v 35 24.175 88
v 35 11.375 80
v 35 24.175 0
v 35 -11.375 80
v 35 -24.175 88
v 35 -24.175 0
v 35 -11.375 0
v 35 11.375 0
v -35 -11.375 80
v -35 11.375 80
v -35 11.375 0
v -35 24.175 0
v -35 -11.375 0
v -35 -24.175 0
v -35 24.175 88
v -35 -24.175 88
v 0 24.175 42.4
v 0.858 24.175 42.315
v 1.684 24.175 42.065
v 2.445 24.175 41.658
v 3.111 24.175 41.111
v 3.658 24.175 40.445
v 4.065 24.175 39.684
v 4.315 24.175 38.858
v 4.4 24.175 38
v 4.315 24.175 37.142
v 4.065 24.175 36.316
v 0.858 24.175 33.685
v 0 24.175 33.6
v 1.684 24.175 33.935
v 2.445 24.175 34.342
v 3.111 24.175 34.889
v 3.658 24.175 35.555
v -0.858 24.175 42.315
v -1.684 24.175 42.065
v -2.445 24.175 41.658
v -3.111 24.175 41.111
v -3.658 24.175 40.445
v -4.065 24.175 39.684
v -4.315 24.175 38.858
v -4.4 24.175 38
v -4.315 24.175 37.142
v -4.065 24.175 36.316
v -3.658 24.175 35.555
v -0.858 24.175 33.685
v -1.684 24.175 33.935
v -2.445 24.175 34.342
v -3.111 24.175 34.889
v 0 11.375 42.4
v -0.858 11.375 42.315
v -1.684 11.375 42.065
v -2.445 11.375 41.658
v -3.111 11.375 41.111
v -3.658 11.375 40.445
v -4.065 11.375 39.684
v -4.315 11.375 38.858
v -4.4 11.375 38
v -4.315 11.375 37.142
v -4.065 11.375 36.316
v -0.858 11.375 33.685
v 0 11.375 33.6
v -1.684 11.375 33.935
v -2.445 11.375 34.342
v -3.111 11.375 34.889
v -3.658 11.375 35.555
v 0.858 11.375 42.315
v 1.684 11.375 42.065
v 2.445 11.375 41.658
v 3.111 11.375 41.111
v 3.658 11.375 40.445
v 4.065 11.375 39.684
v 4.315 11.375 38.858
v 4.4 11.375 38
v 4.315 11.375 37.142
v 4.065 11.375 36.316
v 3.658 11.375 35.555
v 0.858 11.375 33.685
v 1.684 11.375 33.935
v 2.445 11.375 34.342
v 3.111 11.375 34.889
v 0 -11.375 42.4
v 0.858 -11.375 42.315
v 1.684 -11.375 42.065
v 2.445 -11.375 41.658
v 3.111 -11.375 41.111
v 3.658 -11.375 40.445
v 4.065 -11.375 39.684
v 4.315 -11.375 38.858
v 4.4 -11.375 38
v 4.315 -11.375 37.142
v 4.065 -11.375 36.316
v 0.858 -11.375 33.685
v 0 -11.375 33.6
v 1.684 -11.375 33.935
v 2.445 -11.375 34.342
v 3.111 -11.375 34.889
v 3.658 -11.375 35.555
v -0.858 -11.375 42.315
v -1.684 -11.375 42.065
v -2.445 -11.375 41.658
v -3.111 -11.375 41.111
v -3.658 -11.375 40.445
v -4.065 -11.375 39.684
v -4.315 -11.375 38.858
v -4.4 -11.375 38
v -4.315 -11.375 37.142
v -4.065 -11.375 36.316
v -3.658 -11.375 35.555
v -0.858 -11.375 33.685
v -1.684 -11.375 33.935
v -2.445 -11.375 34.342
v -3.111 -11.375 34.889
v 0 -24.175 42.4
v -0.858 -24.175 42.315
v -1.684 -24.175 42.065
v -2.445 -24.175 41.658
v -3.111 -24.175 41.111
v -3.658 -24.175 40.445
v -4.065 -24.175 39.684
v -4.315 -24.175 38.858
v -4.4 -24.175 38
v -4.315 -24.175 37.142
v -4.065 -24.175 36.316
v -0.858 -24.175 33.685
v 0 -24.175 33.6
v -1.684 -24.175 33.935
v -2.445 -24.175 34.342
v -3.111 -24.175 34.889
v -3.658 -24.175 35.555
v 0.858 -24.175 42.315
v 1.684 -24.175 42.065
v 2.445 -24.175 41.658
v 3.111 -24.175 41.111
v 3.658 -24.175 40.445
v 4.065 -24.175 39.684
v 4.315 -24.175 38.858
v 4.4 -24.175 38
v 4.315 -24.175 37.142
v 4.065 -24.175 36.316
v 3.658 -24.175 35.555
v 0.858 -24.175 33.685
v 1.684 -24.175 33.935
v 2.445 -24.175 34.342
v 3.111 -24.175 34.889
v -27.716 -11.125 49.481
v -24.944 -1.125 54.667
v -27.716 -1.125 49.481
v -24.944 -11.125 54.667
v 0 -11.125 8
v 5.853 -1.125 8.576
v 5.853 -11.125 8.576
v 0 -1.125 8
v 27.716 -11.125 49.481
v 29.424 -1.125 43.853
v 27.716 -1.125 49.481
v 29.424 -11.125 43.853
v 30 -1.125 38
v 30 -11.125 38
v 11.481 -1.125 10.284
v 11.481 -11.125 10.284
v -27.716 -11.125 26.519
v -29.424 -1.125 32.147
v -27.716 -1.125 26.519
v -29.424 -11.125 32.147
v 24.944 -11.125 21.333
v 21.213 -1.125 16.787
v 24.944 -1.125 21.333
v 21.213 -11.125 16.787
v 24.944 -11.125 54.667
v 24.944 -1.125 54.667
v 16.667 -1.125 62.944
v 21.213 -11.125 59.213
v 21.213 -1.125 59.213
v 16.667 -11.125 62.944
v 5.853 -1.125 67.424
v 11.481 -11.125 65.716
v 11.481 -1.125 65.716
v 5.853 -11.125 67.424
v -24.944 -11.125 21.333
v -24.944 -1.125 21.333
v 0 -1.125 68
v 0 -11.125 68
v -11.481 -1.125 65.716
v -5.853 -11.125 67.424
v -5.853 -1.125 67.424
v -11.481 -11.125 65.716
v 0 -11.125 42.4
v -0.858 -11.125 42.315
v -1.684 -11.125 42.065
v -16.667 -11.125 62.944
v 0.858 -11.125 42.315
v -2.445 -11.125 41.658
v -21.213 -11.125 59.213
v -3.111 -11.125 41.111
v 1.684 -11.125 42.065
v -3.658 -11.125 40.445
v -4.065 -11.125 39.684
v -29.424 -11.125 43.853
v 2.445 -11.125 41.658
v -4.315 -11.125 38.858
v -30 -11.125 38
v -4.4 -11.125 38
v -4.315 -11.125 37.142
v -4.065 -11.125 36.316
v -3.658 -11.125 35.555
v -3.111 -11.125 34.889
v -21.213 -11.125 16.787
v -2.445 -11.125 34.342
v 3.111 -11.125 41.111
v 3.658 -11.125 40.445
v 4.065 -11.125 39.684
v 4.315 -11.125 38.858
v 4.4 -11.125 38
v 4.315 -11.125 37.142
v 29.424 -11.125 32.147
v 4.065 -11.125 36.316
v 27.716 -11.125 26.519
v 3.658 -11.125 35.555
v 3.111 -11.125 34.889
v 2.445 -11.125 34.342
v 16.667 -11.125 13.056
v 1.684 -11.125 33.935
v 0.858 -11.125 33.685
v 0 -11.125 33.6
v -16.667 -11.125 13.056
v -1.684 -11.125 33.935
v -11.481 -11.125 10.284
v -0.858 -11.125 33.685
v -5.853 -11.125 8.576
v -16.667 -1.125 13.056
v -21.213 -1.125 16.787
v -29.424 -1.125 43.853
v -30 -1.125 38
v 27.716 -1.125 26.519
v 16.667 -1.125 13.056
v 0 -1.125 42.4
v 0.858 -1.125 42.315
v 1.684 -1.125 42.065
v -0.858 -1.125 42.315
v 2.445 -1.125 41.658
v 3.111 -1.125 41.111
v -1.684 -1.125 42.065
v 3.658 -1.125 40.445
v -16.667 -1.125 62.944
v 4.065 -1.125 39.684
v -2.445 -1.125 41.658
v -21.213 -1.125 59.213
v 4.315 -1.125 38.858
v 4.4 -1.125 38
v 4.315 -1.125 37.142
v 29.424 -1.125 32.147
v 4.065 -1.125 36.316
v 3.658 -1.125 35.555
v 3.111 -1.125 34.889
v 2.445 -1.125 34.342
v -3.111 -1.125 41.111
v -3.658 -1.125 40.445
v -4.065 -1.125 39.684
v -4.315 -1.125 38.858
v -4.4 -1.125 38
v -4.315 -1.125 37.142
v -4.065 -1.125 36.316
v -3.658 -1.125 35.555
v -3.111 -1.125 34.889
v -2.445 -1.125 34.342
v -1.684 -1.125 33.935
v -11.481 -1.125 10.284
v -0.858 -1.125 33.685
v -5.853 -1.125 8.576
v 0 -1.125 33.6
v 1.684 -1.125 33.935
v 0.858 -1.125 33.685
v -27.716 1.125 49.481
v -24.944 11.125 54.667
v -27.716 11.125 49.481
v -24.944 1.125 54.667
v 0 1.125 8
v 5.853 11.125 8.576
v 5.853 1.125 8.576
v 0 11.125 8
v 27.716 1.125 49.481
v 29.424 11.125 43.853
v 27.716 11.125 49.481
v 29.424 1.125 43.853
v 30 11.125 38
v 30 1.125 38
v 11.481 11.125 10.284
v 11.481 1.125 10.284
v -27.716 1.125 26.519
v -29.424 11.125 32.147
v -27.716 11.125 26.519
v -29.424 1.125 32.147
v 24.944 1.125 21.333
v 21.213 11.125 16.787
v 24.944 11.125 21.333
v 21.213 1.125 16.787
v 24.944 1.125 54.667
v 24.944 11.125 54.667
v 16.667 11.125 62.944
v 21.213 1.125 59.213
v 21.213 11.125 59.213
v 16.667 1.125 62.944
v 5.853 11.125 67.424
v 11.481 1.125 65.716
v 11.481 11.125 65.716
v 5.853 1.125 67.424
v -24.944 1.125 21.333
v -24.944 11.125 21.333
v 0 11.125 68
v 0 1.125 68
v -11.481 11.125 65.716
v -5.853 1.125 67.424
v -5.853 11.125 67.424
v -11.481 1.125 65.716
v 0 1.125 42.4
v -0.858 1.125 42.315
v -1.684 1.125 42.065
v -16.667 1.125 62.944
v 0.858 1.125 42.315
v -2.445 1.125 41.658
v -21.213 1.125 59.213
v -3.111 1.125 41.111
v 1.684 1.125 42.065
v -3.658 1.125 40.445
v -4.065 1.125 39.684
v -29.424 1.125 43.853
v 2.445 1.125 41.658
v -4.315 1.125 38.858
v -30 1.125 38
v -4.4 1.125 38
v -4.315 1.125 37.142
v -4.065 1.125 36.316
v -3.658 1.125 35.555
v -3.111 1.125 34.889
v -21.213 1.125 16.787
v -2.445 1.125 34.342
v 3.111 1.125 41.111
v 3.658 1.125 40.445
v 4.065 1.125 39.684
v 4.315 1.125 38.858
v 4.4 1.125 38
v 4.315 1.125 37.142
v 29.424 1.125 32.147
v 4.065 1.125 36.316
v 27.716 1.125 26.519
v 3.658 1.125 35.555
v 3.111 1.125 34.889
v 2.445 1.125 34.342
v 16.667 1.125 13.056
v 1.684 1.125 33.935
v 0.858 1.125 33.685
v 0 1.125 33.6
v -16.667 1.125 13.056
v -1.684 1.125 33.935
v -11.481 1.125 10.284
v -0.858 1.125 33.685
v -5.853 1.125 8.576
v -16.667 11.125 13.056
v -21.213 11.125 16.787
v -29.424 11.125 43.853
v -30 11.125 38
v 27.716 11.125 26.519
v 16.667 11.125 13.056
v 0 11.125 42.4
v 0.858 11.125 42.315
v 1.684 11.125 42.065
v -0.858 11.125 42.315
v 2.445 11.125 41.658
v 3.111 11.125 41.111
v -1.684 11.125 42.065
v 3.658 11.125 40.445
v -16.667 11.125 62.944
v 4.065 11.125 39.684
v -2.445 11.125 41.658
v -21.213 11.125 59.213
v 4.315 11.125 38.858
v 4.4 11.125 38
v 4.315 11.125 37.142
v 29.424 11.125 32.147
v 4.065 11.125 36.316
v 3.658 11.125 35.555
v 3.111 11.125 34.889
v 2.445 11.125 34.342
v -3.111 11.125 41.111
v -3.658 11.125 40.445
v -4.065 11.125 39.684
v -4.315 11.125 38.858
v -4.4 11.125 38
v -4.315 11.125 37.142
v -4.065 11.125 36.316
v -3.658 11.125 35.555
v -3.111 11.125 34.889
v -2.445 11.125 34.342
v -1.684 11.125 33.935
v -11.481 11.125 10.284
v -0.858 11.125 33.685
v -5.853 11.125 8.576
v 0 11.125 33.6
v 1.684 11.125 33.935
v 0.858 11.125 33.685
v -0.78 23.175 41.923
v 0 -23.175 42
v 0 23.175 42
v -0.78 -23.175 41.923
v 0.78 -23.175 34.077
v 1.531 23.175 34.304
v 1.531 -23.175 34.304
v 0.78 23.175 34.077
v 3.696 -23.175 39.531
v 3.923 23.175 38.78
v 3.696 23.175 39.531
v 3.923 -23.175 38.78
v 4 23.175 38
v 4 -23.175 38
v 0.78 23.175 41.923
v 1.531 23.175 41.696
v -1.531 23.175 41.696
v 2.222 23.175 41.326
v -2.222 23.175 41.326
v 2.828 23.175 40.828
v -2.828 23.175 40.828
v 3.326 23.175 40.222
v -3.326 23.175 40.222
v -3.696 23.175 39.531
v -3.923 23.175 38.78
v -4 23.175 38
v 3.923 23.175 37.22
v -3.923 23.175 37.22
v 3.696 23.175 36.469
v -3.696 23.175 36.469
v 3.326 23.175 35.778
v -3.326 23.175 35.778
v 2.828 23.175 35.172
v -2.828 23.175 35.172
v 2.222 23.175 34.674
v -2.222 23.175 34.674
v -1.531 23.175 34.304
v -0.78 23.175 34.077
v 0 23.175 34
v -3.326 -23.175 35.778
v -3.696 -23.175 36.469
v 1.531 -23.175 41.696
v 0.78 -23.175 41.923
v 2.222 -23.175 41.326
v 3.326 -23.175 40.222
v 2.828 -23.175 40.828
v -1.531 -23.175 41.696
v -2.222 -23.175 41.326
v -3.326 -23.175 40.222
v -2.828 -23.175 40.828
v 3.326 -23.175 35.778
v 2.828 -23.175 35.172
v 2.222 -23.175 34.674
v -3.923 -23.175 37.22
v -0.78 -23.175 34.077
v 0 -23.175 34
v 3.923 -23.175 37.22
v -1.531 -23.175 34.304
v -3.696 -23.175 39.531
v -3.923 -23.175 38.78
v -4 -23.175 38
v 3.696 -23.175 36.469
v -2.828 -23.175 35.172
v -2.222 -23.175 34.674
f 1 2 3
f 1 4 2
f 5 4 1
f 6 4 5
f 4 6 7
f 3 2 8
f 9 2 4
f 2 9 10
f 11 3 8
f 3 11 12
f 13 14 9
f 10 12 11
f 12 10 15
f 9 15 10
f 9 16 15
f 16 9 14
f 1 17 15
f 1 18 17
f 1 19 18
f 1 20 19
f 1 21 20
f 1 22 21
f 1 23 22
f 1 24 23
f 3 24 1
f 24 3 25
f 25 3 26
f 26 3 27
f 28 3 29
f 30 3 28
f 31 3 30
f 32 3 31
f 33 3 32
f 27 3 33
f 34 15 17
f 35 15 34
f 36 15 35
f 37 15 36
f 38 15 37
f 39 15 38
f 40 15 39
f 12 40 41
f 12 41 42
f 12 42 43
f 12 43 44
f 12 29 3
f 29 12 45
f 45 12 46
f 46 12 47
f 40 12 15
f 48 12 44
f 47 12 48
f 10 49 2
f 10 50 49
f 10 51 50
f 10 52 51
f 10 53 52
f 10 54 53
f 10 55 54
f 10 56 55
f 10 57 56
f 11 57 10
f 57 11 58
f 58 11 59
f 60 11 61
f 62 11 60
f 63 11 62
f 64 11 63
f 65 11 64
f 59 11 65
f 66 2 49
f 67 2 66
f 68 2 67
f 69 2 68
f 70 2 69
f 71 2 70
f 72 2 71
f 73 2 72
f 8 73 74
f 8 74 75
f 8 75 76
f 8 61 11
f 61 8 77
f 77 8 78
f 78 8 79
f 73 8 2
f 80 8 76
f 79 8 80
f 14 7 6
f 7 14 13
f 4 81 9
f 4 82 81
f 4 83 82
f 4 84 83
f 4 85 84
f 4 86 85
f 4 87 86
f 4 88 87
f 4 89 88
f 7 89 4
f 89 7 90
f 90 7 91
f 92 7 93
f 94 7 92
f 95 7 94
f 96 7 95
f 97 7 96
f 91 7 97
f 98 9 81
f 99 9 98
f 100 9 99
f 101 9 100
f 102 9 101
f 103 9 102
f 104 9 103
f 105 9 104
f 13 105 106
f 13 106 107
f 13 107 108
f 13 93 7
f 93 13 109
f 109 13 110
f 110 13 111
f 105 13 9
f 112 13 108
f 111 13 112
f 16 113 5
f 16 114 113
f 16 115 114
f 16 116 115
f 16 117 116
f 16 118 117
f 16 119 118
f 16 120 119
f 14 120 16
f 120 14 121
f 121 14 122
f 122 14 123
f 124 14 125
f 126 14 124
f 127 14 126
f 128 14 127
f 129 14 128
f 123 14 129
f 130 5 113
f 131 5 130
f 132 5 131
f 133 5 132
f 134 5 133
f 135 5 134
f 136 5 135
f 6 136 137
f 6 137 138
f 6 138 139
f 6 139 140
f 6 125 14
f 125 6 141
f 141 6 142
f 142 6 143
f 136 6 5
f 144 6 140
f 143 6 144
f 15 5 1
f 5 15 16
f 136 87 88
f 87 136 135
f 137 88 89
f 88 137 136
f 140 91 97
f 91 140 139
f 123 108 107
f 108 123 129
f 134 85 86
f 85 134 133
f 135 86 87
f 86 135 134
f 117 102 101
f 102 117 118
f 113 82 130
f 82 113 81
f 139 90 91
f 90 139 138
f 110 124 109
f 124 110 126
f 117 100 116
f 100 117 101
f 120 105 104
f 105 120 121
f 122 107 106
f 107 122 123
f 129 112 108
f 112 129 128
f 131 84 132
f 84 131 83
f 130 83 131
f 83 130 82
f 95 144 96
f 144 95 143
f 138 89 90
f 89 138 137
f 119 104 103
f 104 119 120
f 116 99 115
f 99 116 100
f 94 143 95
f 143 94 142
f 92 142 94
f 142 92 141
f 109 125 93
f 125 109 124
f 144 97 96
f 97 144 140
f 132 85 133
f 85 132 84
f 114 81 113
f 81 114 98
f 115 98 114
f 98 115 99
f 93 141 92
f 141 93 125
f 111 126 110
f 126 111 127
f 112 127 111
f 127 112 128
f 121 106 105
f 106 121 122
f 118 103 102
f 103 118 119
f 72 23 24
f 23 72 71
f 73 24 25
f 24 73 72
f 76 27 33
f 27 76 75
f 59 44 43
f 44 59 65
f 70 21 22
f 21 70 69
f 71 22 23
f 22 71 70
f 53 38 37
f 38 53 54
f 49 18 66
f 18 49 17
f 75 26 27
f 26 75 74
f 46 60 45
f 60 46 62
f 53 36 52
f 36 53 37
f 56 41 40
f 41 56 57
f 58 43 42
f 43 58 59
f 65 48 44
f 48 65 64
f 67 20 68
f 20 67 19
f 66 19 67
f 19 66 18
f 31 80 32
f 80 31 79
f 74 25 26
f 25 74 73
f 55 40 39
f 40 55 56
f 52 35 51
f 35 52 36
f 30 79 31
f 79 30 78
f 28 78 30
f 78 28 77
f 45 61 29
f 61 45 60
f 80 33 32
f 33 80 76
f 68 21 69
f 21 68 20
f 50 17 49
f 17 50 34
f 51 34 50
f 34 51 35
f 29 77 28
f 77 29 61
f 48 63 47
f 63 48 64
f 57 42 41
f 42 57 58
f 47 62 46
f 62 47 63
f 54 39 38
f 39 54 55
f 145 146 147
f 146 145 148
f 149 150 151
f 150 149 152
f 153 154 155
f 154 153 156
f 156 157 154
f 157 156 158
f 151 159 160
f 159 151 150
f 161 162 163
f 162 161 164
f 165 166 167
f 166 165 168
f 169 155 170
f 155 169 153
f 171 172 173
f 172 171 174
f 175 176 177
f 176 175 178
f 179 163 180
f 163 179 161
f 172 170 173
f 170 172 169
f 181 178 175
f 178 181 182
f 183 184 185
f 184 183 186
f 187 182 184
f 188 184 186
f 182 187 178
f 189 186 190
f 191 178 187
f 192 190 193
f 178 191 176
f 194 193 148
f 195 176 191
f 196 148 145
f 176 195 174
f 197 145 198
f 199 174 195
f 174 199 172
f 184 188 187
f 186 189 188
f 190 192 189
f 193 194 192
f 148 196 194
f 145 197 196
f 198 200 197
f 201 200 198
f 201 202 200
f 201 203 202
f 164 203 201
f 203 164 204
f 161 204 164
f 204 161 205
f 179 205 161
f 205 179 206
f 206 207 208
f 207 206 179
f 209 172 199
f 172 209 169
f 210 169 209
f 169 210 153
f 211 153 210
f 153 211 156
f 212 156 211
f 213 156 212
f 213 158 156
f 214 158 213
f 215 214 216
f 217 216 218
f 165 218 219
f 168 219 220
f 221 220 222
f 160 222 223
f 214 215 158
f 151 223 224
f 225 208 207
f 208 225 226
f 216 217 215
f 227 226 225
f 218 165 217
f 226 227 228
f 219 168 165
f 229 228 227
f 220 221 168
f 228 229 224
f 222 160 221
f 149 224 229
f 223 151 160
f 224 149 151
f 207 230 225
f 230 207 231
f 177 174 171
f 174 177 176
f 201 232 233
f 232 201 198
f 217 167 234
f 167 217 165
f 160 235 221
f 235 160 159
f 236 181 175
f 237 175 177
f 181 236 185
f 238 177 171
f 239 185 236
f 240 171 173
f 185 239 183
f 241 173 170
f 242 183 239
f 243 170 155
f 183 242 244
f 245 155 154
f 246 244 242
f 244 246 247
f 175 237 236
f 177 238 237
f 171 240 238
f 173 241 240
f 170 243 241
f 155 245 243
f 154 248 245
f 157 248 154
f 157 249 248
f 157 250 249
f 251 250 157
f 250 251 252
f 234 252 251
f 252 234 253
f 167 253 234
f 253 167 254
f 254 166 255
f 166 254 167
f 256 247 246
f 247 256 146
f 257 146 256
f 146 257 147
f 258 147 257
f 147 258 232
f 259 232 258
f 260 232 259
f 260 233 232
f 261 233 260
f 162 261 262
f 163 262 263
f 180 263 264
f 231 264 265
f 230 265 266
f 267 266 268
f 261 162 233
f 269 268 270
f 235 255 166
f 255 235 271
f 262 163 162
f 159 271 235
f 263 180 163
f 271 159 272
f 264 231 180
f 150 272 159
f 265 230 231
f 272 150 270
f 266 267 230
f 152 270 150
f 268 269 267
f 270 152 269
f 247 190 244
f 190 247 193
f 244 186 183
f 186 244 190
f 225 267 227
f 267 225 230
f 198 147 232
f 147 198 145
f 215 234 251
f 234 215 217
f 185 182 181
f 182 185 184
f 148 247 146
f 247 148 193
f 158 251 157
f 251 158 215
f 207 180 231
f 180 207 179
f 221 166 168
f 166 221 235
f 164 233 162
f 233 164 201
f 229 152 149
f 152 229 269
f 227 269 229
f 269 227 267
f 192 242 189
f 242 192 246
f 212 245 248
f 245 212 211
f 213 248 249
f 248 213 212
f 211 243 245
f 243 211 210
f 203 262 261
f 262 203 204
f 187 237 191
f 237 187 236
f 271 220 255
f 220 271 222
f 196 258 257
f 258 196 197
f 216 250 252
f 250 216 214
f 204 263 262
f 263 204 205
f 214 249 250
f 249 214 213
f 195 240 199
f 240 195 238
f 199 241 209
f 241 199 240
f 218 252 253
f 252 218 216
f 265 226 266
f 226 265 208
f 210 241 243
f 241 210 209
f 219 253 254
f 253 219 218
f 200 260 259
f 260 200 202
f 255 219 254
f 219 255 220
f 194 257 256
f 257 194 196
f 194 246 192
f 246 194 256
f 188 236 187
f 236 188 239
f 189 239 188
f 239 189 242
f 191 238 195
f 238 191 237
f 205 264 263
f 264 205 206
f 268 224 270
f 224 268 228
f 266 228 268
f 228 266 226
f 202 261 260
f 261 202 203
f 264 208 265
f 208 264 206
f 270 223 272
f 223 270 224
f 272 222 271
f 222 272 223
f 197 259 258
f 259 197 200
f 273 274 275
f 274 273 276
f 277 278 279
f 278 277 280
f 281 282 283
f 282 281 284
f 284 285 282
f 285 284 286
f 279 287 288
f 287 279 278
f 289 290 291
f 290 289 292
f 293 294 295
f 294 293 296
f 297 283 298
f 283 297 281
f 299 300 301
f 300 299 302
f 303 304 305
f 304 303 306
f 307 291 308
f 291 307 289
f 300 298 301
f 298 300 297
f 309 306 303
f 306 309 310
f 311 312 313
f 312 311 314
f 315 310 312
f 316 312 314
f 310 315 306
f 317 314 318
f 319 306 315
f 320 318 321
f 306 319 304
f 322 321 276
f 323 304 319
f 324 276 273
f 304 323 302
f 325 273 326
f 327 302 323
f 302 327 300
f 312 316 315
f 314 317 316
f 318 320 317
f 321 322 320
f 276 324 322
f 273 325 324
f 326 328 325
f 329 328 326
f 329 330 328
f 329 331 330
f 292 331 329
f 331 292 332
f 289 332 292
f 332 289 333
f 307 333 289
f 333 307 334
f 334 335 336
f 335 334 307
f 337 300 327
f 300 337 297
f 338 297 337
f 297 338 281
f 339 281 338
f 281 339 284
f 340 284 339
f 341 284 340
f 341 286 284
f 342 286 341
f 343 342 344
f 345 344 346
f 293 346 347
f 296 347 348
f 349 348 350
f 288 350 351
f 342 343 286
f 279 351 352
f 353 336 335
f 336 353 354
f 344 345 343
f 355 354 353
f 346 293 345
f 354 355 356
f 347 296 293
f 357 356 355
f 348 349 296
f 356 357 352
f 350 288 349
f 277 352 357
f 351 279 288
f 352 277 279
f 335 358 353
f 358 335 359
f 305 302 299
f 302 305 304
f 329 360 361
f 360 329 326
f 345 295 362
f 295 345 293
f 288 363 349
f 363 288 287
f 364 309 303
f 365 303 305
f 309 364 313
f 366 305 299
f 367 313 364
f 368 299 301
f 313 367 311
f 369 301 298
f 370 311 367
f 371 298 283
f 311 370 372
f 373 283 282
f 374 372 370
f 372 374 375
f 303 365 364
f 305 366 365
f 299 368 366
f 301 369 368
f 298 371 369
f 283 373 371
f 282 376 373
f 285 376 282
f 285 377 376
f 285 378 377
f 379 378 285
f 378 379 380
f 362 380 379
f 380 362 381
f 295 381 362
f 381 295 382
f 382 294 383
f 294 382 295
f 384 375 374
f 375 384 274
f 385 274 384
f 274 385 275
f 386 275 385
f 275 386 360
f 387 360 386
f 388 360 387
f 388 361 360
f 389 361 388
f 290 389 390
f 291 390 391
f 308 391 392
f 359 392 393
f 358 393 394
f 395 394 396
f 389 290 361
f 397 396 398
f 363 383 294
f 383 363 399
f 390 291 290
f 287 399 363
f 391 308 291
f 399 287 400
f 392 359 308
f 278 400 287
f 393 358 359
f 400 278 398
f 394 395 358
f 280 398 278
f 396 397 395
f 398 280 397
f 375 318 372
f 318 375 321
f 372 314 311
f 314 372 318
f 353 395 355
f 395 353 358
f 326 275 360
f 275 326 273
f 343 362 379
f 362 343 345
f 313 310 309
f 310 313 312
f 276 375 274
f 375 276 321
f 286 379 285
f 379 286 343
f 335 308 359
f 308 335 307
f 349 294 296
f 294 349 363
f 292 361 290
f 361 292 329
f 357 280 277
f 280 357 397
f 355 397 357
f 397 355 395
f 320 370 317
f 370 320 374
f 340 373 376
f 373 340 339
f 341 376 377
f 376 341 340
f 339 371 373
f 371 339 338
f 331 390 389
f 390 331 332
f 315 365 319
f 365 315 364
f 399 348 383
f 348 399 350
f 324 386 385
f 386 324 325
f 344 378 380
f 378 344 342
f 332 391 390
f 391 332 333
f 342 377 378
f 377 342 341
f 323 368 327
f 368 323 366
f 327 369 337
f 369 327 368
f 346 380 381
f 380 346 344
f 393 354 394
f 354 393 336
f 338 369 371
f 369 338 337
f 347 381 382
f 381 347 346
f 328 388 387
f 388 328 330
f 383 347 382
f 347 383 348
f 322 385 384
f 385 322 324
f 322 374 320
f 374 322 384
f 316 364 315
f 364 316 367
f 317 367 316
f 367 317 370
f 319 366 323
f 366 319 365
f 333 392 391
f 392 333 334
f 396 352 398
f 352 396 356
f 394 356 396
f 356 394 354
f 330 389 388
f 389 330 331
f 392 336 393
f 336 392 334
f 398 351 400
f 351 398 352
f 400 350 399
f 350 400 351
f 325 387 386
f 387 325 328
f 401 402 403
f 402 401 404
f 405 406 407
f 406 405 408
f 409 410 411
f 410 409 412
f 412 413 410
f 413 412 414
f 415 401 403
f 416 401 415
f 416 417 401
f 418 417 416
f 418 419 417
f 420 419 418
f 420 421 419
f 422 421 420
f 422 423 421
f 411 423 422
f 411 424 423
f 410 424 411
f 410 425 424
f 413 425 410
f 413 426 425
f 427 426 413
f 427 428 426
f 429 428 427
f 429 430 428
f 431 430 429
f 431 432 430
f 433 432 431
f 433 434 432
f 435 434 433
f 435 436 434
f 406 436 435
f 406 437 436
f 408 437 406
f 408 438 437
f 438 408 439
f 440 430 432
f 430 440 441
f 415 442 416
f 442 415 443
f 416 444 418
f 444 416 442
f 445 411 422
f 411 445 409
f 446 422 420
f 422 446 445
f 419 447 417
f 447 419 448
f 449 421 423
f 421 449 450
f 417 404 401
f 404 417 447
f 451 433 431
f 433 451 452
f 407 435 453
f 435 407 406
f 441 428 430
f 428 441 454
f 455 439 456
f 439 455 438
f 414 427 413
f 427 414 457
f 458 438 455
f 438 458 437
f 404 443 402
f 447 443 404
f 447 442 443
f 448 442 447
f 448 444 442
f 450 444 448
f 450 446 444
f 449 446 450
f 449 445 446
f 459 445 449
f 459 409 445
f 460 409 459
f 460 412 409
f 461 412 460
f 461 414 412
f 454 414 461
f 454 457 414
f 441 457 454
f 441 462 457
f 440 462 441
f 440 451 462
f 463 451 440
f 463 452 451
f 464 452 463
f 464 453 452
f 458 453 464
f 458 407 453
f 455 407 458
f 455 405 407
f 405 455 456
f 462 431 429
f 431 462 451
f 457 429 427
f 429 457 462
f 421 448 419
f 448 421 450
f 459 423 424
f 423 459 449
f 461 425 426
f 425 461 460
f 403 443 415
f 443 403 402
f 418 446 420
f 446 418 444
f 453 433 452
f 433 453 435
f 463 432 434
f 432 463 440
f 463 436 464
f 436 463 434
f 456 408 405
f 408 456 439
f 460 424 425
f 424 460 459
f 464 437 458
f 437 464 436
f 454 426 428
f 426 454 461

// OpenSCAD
$fn = 32;

// ------------------------------------------------------------------------
// Trolley wheel set: wheels d60, fork 80 mm tall
// Every part is its own module, assembly() places every instance.
// ------------------------------------------------------------------------

// --- part 1 ---
module trolley_fork() {
  difference() {
    union() {
      translate([-35, 11.375, 0]) cube([70, 12.8, 80]);
      translate([-35, -24.175, 0]) cube([70, 12.8, 80]);
      translate([-35, -24.175, 80]) cube([70, 48.35, 8]);
    }
    translate([0, -17.775, 38]) rotate([90, 0, 0]) cylinder(h = 14.8, d = 8.8, center = true);
    translate([0, 17.775, 38]) rotate([90, 0, 0]) cylinder(h = 14.8, d = 8.8, center = true);
  }
}

// --- part 2 ---
module trolley_wheel() {
  difference() {
      translate([0, 0, 0]) cylinder(h = 10, d = 60);
      translate([0, 0, -1]) cylinder(h = 12, d = 8.8);
    }
}

// --- part 3 ---
module trolley_axle() {
  translate([0, 0, -23.175]) cylinder(h = 46.35, d = 8);
}

// --- assembly ---
module assembly() {
  color([0.80, 0.24, 0.20]) translate([0, 0, 0]) rotate([0, 0, 0]) trolley_fork();
  color([0.20, 0.45, 0.75]) translate([0, -1.125, 38]) rotate([90, 0, 0]) trolley_wheel();
  color([0.25, 0.62, 0.32]) translate([0, 11.125, 38]) rotate([90, 0, 0]) trolley_wheel();
  color([0.92, 0.70, 0.18]) translate([0, 0, 38]) rotate([90, 0, 0]) trolley_axle();
}

assembly();
